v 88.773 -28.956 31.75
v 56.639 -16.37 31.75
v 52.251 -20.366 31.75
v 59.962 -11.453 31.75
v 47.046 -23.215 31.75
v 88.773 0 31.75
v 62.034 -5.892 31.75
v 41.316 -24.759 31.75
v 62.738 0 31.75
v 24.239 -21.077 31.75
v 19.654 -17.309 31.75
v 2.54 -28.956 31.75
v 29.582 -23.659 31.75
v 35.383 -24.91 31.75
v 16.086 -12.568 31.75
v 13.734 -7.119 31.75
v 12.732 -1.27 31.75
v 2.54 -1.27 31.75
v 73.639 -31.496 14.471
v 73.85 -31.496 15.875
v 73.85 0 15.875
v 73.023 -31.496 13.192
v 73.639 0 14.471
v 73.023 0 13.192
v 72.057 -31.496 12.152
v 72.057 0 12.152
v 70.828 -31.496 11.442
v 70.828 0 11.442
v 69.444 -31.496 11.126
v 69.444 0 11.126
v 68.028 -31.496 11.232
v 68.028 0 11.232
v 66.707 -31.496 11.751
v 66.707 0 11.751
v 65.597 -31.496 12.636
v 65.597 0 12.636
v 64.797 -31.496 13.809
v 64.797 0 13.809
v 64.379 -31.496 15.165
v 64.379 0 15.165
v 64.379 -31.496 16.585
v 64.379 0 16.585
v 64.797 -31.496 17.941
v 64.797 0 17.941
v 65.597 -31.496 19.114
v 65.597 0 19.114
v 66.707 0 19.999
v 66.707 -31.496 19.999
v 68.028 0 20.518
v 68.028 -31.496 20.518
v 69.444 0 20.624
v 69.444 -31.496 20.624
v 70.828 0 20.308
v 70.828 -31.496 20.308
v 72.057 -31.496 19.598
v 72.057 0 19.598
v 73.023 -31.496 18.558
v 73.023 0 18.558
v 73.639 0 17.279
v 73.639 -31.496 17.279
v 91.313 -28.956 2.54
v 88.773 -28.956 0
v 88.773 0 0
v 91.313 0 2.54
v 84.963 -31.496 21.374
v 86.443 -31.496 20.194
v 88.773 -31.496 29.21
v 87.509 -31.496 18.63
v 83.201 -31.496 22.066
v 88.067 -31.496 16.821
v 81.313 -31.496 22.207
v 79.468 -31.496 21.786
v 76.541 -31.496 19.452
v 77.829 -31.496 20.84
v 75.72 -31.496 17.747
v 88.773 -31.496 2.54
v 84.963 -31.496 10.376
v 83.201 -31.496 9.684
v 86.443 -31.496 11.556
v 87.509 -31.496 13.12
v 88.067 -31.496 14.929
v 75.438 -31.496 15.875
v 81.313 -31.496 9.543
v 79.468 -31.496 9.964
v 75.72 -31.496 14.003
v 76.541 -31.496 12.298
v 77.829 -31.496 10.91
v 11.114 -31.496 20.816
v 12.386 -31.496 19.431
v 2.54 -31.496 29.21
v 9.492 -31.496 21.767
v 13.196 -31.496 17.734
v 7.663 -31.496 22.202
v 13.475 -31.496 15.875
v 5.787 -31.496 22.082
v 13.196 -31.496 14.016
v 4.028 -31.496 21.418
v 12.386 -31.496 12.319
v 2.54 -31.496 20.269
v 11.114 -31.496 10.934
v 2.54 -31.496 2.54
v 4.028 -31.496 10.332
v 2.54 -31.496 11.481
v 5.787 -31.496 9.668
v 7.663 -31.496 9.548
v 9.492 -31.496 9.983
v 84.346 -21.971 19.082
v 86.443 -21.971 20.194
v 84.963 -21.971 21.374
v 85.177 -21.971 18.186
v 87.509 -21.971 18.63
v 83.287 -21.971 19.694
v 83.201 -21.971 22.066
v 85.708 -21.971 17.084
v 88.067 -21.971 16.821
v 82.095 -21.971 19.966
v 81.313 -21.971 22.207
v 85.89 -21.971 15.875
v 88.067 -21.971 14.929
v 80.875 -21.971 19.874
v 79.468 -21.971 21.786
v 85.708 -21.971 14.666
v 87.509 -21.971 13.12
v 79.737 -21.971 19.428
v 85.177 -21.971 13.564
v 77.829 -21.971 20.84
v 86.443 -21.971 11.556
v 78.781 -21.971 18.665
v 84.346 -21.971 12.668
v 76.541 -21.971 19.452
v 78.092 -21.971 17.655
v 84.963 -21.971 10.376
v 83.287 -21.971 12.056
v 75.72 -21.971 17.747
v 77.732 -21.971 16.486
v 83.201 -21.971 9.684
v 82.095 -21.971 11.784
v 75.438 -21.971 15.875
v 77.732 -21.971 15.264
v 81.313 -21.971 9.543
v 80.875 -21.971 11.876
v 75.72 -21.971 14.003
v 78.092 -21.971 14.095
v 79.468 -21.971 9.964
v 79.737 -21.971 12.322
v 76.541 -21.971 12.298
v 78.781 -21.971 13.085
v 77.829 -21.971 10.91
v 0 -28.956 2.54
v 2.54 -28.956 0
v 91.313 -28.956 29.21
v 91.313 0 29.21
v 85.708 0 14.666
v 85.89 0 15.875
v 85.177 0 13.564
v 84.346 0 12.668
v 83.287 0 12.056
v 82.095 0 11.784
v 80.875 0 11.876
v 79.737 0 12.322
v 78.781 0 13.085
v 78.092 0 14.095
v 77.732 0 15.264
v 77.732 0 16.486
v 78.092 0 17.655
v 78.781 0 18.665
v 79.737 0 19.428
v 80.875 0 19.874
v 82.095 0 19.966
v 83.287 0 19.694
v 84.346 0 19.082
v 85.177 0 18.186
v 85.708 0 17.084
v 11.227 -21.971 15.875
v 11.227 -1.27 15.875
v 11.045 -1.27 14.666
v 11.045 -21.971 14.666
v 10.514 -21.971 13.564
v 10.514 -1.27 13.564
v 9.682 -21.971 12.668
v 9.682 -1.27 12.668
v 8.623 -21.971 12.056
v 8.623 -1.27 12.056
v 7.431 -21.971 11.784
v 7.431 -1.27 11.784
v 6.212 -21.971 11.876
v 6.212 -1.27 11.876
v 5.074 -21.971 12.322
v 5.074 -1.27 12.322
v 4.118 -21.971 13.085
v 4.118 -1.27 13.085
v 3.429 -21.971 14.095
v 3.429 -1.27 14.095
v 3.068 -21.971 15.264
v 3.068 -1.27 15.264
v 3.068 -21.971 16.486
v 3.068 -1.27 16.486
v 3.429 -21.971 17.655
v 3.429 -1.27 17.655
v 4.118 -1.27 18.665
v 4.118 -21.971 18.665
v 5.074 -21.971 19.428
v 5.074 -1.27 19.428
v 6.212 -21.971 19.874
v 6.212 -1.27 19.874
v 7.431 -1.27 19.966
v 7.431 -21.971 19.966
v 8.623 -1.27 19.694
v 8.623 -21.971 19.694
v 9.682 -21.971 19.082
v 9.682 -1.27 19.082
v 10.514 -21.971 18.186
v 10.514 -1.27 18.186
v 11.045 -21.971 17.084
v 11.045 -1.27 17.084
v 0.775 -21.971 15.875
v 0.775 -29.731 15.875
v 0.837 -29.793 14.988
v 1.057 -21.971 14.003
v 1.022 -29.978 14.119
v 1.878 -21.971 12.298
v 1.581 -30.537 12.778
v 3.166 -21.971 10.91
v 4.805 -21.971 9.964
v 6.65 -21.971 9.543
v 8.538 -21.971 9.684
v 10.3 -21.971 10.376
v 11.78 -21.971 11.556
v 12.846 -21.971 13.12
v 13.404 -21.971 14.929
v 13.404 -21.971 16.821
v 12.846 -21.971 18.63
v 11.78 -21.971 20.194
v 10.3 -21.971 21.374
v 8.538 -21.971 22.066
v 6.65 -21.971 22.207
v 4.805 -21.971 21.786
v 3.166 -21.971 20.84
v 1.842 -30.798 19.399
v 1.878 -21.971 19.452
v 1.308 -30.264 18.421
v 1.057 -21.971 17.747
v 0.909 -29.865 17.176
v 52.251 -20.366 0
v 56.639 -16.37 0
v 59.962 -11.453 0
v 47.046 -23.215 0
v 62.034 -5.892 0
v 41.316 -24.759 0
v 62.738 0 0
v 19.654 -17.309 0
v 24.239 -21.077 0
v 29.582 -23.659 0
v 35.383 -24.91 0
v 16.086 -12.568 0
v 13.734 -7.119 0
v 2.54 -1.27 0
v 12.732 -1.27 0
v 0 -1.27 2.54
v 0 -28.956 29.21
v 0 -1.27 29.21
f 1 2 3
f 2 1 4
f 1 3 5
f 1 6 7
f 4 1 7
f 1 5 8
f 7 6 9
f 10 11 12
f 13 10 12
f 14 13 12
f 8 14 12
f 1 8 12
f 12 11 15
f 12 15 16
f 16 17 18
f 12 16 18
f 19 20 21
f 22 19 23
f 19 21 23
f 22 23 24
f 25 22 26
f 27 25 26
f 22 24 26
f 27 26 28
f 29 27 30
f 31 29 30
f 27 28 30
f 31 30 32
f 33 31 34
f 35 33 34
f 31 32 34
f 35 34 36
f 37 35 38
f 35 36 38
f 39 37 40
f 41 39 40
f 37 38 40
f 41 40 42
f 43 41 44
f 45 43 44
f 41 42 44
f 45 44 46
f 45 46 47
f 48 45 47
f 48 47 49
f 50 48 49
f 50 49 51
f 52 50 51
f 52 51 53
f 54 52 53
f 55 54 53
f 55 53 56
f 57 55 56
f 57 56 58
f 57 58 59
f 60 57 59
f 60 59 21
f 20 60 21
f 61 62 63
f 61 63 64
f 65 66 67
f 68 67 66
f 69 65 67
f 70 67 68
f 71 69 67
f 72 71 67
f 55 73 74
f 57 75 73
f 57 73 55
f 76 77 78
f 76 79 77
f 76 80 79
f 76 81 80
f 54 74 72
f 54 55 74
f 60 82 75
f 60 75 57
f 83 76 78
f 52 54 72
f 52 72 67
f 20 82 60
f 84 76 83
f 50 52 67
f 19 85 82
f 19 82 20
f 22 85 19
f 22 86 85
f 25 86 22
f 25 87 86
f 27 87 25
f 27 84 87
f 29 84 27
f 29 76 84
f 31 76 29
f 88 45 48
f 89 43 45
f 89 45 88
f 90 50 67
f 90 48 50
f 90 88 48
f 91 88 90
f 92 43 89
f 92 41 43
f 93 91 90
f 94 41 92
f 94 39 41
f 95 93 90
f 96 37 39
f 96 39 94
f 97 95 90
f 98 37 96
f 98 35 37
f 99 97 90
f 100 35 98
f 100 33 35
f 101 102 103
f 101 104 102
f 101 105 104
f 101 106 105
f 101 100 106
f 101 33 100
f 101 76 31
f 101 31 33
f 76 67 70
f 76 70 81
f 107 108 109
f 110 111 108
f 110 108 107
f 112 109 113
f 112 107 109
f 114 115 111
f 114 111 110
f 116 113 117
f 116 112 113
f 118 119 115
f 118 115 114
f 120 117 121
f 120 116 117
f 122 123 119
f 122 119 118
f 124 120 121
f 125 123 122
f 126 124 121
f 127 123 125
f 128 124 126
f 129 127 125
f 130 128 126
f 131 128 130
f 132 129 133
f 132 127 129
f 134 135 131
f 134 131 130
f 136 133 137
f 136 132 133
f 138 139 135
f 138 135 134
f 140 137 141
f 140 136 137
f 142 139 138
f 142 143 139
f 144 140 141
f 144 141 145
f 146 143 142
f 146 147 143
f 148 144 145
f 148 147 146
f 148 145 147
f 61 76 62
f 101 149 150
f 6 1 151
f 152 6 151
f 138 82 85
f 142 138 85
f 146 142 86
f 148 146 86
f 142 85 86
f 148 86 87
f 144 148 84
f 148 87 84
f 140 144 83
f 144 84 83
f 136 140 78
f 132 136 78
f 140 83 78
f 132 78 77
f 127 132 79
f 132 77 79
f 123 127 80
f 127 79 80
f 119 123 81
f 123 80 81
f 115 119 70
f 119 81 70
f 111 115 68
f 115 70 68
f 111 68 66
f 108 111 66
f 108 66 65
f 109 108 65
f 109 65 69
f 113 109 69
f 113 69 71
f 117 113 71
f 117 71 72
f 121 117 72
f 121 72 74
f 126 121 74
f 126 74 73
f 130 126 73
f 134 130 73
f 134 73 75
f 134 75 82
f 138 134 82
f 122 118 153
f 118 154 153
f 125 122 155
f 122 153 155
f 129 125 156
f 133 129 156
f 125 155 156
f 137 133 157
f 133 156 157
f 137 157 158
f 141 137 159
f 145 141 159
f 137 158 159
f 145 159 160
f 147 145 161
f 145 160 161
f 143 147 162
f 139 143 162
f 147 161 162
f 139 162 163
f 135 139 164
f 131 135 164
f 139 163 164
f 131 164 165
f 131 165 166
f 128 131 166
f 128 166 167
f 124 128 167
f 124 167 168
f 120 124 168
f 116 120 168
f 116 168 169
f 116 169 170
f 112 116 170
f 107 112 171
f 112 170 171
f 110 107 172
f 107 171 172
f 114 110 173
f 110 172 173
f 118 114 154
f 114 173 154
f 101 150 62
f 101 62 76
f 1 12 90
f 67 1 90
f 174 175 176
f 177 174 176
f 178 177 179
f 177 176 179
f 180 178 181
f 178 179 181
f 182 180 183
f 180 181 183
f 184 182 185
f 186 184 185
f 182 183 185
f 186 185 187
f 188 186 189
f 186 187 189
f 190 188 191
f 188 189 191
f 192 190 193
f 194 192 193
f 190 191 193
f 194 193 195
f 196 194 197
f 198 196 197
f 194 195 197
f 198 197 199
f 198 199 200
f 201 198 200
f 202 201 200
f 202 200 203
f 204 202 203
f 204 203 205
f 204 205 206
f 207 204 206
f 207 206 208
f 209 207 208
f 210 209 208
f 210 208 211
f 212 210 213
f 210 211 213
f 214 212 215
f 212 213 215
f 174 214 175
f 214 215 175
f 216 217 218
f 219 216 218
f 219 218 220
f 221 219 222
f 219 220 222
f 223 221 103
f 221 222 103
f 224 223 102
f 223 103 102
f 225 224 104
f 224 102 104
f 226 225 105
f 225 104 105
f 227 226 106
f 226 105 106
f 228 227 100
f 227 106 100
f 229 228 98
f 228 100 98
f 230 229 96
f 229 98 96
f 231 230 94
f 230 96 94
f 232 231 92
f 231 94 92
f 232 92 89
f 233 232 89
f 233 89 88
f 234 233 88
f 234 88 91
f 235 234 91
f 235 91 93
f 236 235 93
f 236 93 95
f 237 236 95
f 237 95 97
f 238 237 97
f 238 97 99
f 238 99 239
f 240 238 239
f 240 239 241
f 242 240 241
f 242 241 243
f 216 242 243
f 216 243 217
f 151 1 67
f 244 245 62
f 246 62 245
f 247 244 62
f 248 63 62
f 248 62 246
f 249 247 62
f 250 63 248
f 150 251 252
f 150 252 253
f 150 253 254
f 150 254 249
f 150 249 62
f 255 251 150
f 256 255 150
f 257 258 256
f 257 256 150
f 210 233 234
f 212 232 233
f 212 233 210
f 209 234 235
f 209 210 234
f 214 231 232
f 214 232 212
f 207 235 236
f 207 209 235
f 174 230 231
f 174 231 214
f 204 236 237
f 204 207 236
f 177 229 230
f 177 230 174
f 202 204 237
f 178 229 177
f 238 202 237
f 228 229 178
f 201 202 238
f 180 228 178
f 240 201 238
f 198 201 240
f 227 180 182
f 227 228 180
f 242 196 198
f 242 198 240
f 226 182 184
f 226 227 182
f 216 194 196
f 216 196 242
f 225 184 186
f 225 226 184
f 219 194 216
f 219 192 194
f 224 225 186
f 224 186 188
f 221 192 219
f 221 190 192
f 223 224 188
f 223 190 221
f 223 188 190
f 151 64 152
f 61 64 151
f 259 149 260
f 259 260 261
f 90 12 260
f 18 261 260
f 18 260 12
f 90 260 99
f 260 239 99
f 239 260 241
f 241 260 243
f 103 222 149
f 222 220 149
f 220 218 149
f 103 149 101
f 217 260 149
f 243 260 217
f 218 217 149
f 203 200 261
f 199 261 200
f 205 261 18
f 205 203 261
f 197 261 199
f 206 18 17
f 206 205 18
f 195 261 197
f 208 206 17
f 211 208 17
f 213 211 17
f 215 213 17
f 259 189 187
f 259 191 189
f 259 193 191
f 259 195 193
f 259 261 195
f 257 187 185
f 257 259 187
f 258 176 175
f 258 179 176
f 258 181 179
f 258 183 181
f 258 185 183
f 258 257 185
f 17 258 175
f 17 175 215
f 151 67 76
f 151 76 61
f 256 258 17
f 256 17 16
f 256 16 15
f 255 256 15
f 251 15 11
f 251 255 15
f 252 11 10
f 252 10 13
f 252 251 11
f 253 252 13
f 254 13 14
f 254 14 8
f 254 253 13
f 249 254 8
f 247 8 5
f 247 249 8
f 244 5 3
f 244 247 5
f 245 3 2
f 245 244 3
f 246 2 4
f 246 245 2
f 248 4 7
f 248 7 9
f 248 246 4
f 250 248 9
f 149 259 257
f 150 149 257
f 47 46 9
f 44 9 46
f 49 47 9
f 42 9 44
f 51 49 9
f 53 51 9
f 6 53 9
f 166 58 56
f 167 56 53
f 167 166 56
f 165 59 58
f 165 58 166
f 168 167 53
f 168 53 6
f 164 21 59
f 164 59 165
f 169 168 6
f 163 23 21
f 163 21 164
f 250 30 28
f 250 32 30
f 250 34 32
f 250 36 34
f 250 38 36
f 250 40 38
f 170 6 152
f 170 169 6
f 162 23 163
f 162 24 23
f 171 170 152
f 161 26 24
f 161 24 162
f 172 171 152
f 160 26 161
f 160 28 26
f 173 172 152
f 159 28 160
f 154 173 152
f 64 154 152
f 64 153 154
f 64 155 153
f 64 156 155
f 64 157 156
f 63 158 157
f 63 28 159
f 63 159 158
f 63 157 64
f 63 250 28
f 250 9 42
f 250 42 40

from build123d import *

# Parameters (mm, degrees)
BOSS_EXTRUDE1_DEPTH                               = 31.75
CBORE_FOR_5_16_SOCKET_HEAD_CAP_SCREW1_D           = 8.2042
CBORE_FOR_5_16_SOCKET_HEAD_CAP_SCREW1_CBORE_D     = 12.7
CBORE_FOR_5_16_SOCKET_HEAD_CAP_SCREW1_CBORE_DEPTH = 9.525
F_3_8_0_375_CLEARANCE_DOWEL_HOLE2_D               = 9.525
SKETCH9_W                                         = 23.721553131
SKETCH9_H                                         = 31.75
CUT_EXTRUDE1_DEPTH                                = 1.27


with BuildPart() as part:
    # Sketch1 → Boss-Extrude1 (new body)
    with BuildSketch(Plane.XY):
        with BuildLine():
            Line((0, 0), (12.7, 0))
            ThreePointArc((12.7, 0), (37.719, -25.019), (62.738, 0))
            Line((62.738, 0), (91.313, 0))
            Line((91.313, 0), (91.313, -31.496))
            Line((91.313, -31.496), (0, -31.496))
            Line((0, -31.496), (0, 0))
        make_face()
    extrude(amount=BOSS_EXTRUDE1_DEPTH)

    # CBORE for 5/16 Socket Head Cap Screw1 (through all)
    with Locations(Plane(origin=(0, -31.496, 0), x_dir=(-1, 0, 0), z_dir=(0, -1, 0))):
        with Locations((-7.1247, -15.875), (-81.788, -15.875)):
            CounterBoreHole(CBORE_FOR_5_16_SOCKET_HEAD_CAP_SCREW1_D / 2, CBORE_FOR_5_16_SOCKET_HEAD_CAP_SCREW1_CBORE_D / 2, CBORE_FOR_5_16_SOCKET_HEAD_CAP_SCREW1_CBORE_DEPTH)

    # 3/8 (0.375) Clearance Dowel Hole2 (through all)
    with Locations(Plane(origin=(0, -31.496, 0), x_dir=(-1, 0, 0), z_dir=(0, -1, 0))):
        with Locations((-69.088, -15.875)):
            Hole(F_3_8_0_375_CLEARANCE_DOWEL_HOLE2_D / 2)

    # Sketch9 → Cut-Extrude1 (cut)
    with BuildSketch(Plane(origin=(0, 0, 0), x_dir=(1, 0, 0), z_dir=(0, 1, 0))):
        with Locations((11.860776566, -15.875)):
            Rectangle(SKETCH9_W, SKETCH9_H)
    extrude(amount=-CUT_EXTRUDE1_DEPTH, mode=Mode.SUBTRACT)

    # Chamfer1
    # the kernel refuses this chamfer: 2.54 mm, written as the material it takes off along each edge
    with BuildSketch(Plane(origin=(89.619666667, -29.802666667, 30.056666667), x_dir=(0, -0.7071067811865476, -0.7071067811865476), z_dir=(0.5773502691896247, -0.5773502691896263, 0.5773502691896263)), Plane(origin=(1.693333333, -29.802666667, 1.693333333), x_dir=(0.7071067811865474, 0, -0.7071067811865477), z_dir=(-0.5773502691896264, -0.5773502691896247, -0.5773502691896262))) as chamfer1_piece_1:
        Polygon((-1.796051224, -1.036950658), (1.796051224, -1.036950658), (0, 2.073901316), align=None)
    extrude(amount=3.226233304, mode=Mode.SUBTRACT)
    with BuildSketch(Plane(origin=(89.619666667, -29.802666667, 1.693333333), x_dir=(0, -0.7071067811865474, 0.7071067811865477), z_dir=(0.5773502691896246, -0.5773502691896264, -0.5773502691896262)), Plane(origin=(1.693333333, -29.802666667, 30.056666667), x_dir=(0.7071067811865476, 0, 0.7071067811865476), z_dir=(-0.5773502691896263, -0.5773502691896247, 0.5773502691896263))) as chamfer1_piece_2:
        Polygon((-1.796051224, 1.036950658), (1.796051224, 1.036950658), (0, -2.073901316), align=None)
    extrude(amount=3.226233304, mode=Mode.SUBTRACT)
    with BuildSketch(Plane(origin=(91.313, 6.532074789, 31.75), x_dir=(-0.9996219169112968, 0, 0.02749587661058591), z_dir=(0, -1, 0))) as chamfer1_piece_3:
        with BuildLine():
            Line((2.612829916, 0), (-0.143629773, 2.608879196))
            Line((-0.143629773, 2.608879196), (-0.194410567, 2.607482405))
            ThreePointArc((-0.194410567, 2.607482405), (-0.086688237, 1.304030487), (-0.050780793, -0.001396791))
            Line((-0.050780793, -0.001396791), (0.001396791, -0.050780793))
            ThreePointArc((0.001396791, -0.050780793), (1.306824068, -0.01487335), (2.614226706, -0.050780793))
            Line((2.614226706, -0.050780793), (2.612829916, 0))
        make_face()
    extrude(amount=44.560149579, mode=Mode.SUBTRACT)
    with BuildSketch(Plane(origin=(91.313, -31.496, -6.532074789), x_dir=(-0.9996219169112968, -0.02749587661058591, 0), z_dir=(0, 0, 1)), Plane(origin=(0, -31.496, -6.532074789), x_dir=(-0.027495876610586358, 0.9996219169112968, 0), z_dir=(0, 0, 1))) as chamfer1_piece_4:
        with BuildLine():
            Line((2.612829916, 0), (-0.143629773, -2.608879196))
            Line((-0.143629773, -2.608879196), (-0.194410567, -2.607482405))
            ThreePointArc((-0.194410567, -2.607482405), (-0.086688237, -1.304030487), (-0.050780793, 0.001396791))
            Line((-0.050780793, 0.001396791), (0.001396791, 0.050780793))
            ThreePointArc((0.001396791, 0.050780793), (1.306824068, 0.01487335), (2.614226706, 0.050780793))
            Line((2.614226706, 0.050780793), (2.612829916, 0))
        make_face()
    extrude(amount=44.814149579, mode=Mode.SUBTRACT)
    with BuildSketch(Plane(origin=(0, -38.028074789, 0), x_dir=(-0.027495876610586365, 0, 0.9996219169112968), z_dir=(0, 1, 0))) as chamfer1_piece_5:
        with BuildLine():
            Line((2.612829916, 0), (-0.143629773, 2.608879196))
            Line((-0.143629773, 2.608879196), (-0.194410567, 2.607482405))
            ThreePointArc((-0.194410567, 2.607482405), (-0.086688237, 1.304030487), (-0.050780793, -0.001396791))
            Line((-0.050780793, -0.001396791), (0.001396791, -0.050780793))
            ThreePointArc((0.001396791, -0.050780793), (1.306824068, -0.01487335), (2.614226706, -0.050780793))
            Line((2.614226706, -0.050780793), (2.612829916, 0))
        make_face()
    extrude(amount=43.290149579, mode=Mode.SUBTRACT)
    with BuildSketch(Plane(origin=(0, -38.028074789, 31.75), x_dir=(-0.0274958766105864, 0, -0.9996219169112968), z_dir=(0, 1, 0))) as chamfer1_piece_6:
        with BuildLine():
            Line((2.612829916, 0), (-0.143629773, -2.608879196))
            Line((-0.143629773, -2.608879196), (-0.194410567, -2.607482405))
            ThreePointArc((-0.194410567, -2.607482405), (-0.086688237, -1.304030487), (-0.050780793, 0.001396791))
            Line((-0.050780793, 0.001396791), (0.001396791, 0.050780793))
            ThreePointArc((0.001396791, 0.050780793), (1.306824068, 0.01487335), (2.614226706, 0.050780793))
            Line((2.614226706, 0.050780793), (2.612829916, 0))
        make_face()
    extrude(amount=43.290149579, mode=Mode.SUBTRACT)
    with BuildSketch(Plane(origin=(97.845074789, -31.496, 31.75), x_dir=(0, 0.9996219169112966, 0.027495876610585942), z_dir=(-1, 0, 0))) as chamfer1_piece_7:
        with BuildLine():
            Line((2.612829916, 0), (-0.143629773, 2.608879196))
            Line((-0.143629773, 2.608879196), (-0.194410567, 2.607482405))
            ThreePointArc((-0.194410567, 2.607482405), (-0.086688237, 1.304030487), (-0.050780793, -0.001396791))
            Line((-0.050780793, -0.001396791), (0.001396791, -0.050780793))
            ThreePointArc((0.001396791, -0.050780793), (1.306824068, -0.01487335), (2.614226706, -0.050780793))
            Line((2.614226706, -0.050780793), (2.612829916, 0))
        make_face()
    extrude(amount=104.377149579, mode=Mode.SUBTRACT)
    with BuildSketch(Plane(origin=(91.313, 6.532074789, 0), x_dir=(-0.9996219169112968, 0, -0.027495876610586324), z_dir=(0, -1, 0))) as chamfer1_piece_8:
        with BuildLine():
            Line((2.612829916, 0), (-0.143629773, -2.608879196))
            Line((-0.143629773, -2.608879196), (-0.194410567, -2.607482405))
            ThreePointArc((-0.194410567, -2.607482405), (-0.086688237, -1.304030487), (-0.050780793, 0.001396791))
            Line((-0.050780793, 0.001396791), (0.001396791, 0.050780793))
            ThreePointArc((0.001396791, 0.050780793), (1.306824068, 0.01487335), (2.614226706, 0.050780793))
            Line((2.614226706, 0.050780793), (2.612829916, 0))
        make_face()
    extrude(amount=44.560149579, mode=Mode.SUBTRACT)
    with BuildSketch(Plane(origin=(97.845074789, -31.496, 0), x_dir=(0, 0.9996219169112966, -0.0274958766105864), z_dir=(-1, 0, 0))) as chamfer1_piece_9:
        with BuildLine():
            Line((2.612829916, 0), (-0.143629773, -2.608879196))
            Line((-0.143629773, -2.608879196), (-0.194410567, -2.607482405))
            ThreePointArc((-0.194410567, -2.607482405), (-0.086688237, -1.304030487), (-0.050780793, 0.001396791))
            Line((-0.050780793, 0.001396791), (0.001396791, 0.050780793))
            ThreePointArc((0.001396791, 0.050780793), (1.306824068, 0.01487335), (2.614226706, 0.050780793))
            Line((2.614226706, 0.050780793), (2.612829916, 0))
        make_face()
    extrude(amount=104.377149579, mode=Mode.SUBTRACT)


solid = part.part
